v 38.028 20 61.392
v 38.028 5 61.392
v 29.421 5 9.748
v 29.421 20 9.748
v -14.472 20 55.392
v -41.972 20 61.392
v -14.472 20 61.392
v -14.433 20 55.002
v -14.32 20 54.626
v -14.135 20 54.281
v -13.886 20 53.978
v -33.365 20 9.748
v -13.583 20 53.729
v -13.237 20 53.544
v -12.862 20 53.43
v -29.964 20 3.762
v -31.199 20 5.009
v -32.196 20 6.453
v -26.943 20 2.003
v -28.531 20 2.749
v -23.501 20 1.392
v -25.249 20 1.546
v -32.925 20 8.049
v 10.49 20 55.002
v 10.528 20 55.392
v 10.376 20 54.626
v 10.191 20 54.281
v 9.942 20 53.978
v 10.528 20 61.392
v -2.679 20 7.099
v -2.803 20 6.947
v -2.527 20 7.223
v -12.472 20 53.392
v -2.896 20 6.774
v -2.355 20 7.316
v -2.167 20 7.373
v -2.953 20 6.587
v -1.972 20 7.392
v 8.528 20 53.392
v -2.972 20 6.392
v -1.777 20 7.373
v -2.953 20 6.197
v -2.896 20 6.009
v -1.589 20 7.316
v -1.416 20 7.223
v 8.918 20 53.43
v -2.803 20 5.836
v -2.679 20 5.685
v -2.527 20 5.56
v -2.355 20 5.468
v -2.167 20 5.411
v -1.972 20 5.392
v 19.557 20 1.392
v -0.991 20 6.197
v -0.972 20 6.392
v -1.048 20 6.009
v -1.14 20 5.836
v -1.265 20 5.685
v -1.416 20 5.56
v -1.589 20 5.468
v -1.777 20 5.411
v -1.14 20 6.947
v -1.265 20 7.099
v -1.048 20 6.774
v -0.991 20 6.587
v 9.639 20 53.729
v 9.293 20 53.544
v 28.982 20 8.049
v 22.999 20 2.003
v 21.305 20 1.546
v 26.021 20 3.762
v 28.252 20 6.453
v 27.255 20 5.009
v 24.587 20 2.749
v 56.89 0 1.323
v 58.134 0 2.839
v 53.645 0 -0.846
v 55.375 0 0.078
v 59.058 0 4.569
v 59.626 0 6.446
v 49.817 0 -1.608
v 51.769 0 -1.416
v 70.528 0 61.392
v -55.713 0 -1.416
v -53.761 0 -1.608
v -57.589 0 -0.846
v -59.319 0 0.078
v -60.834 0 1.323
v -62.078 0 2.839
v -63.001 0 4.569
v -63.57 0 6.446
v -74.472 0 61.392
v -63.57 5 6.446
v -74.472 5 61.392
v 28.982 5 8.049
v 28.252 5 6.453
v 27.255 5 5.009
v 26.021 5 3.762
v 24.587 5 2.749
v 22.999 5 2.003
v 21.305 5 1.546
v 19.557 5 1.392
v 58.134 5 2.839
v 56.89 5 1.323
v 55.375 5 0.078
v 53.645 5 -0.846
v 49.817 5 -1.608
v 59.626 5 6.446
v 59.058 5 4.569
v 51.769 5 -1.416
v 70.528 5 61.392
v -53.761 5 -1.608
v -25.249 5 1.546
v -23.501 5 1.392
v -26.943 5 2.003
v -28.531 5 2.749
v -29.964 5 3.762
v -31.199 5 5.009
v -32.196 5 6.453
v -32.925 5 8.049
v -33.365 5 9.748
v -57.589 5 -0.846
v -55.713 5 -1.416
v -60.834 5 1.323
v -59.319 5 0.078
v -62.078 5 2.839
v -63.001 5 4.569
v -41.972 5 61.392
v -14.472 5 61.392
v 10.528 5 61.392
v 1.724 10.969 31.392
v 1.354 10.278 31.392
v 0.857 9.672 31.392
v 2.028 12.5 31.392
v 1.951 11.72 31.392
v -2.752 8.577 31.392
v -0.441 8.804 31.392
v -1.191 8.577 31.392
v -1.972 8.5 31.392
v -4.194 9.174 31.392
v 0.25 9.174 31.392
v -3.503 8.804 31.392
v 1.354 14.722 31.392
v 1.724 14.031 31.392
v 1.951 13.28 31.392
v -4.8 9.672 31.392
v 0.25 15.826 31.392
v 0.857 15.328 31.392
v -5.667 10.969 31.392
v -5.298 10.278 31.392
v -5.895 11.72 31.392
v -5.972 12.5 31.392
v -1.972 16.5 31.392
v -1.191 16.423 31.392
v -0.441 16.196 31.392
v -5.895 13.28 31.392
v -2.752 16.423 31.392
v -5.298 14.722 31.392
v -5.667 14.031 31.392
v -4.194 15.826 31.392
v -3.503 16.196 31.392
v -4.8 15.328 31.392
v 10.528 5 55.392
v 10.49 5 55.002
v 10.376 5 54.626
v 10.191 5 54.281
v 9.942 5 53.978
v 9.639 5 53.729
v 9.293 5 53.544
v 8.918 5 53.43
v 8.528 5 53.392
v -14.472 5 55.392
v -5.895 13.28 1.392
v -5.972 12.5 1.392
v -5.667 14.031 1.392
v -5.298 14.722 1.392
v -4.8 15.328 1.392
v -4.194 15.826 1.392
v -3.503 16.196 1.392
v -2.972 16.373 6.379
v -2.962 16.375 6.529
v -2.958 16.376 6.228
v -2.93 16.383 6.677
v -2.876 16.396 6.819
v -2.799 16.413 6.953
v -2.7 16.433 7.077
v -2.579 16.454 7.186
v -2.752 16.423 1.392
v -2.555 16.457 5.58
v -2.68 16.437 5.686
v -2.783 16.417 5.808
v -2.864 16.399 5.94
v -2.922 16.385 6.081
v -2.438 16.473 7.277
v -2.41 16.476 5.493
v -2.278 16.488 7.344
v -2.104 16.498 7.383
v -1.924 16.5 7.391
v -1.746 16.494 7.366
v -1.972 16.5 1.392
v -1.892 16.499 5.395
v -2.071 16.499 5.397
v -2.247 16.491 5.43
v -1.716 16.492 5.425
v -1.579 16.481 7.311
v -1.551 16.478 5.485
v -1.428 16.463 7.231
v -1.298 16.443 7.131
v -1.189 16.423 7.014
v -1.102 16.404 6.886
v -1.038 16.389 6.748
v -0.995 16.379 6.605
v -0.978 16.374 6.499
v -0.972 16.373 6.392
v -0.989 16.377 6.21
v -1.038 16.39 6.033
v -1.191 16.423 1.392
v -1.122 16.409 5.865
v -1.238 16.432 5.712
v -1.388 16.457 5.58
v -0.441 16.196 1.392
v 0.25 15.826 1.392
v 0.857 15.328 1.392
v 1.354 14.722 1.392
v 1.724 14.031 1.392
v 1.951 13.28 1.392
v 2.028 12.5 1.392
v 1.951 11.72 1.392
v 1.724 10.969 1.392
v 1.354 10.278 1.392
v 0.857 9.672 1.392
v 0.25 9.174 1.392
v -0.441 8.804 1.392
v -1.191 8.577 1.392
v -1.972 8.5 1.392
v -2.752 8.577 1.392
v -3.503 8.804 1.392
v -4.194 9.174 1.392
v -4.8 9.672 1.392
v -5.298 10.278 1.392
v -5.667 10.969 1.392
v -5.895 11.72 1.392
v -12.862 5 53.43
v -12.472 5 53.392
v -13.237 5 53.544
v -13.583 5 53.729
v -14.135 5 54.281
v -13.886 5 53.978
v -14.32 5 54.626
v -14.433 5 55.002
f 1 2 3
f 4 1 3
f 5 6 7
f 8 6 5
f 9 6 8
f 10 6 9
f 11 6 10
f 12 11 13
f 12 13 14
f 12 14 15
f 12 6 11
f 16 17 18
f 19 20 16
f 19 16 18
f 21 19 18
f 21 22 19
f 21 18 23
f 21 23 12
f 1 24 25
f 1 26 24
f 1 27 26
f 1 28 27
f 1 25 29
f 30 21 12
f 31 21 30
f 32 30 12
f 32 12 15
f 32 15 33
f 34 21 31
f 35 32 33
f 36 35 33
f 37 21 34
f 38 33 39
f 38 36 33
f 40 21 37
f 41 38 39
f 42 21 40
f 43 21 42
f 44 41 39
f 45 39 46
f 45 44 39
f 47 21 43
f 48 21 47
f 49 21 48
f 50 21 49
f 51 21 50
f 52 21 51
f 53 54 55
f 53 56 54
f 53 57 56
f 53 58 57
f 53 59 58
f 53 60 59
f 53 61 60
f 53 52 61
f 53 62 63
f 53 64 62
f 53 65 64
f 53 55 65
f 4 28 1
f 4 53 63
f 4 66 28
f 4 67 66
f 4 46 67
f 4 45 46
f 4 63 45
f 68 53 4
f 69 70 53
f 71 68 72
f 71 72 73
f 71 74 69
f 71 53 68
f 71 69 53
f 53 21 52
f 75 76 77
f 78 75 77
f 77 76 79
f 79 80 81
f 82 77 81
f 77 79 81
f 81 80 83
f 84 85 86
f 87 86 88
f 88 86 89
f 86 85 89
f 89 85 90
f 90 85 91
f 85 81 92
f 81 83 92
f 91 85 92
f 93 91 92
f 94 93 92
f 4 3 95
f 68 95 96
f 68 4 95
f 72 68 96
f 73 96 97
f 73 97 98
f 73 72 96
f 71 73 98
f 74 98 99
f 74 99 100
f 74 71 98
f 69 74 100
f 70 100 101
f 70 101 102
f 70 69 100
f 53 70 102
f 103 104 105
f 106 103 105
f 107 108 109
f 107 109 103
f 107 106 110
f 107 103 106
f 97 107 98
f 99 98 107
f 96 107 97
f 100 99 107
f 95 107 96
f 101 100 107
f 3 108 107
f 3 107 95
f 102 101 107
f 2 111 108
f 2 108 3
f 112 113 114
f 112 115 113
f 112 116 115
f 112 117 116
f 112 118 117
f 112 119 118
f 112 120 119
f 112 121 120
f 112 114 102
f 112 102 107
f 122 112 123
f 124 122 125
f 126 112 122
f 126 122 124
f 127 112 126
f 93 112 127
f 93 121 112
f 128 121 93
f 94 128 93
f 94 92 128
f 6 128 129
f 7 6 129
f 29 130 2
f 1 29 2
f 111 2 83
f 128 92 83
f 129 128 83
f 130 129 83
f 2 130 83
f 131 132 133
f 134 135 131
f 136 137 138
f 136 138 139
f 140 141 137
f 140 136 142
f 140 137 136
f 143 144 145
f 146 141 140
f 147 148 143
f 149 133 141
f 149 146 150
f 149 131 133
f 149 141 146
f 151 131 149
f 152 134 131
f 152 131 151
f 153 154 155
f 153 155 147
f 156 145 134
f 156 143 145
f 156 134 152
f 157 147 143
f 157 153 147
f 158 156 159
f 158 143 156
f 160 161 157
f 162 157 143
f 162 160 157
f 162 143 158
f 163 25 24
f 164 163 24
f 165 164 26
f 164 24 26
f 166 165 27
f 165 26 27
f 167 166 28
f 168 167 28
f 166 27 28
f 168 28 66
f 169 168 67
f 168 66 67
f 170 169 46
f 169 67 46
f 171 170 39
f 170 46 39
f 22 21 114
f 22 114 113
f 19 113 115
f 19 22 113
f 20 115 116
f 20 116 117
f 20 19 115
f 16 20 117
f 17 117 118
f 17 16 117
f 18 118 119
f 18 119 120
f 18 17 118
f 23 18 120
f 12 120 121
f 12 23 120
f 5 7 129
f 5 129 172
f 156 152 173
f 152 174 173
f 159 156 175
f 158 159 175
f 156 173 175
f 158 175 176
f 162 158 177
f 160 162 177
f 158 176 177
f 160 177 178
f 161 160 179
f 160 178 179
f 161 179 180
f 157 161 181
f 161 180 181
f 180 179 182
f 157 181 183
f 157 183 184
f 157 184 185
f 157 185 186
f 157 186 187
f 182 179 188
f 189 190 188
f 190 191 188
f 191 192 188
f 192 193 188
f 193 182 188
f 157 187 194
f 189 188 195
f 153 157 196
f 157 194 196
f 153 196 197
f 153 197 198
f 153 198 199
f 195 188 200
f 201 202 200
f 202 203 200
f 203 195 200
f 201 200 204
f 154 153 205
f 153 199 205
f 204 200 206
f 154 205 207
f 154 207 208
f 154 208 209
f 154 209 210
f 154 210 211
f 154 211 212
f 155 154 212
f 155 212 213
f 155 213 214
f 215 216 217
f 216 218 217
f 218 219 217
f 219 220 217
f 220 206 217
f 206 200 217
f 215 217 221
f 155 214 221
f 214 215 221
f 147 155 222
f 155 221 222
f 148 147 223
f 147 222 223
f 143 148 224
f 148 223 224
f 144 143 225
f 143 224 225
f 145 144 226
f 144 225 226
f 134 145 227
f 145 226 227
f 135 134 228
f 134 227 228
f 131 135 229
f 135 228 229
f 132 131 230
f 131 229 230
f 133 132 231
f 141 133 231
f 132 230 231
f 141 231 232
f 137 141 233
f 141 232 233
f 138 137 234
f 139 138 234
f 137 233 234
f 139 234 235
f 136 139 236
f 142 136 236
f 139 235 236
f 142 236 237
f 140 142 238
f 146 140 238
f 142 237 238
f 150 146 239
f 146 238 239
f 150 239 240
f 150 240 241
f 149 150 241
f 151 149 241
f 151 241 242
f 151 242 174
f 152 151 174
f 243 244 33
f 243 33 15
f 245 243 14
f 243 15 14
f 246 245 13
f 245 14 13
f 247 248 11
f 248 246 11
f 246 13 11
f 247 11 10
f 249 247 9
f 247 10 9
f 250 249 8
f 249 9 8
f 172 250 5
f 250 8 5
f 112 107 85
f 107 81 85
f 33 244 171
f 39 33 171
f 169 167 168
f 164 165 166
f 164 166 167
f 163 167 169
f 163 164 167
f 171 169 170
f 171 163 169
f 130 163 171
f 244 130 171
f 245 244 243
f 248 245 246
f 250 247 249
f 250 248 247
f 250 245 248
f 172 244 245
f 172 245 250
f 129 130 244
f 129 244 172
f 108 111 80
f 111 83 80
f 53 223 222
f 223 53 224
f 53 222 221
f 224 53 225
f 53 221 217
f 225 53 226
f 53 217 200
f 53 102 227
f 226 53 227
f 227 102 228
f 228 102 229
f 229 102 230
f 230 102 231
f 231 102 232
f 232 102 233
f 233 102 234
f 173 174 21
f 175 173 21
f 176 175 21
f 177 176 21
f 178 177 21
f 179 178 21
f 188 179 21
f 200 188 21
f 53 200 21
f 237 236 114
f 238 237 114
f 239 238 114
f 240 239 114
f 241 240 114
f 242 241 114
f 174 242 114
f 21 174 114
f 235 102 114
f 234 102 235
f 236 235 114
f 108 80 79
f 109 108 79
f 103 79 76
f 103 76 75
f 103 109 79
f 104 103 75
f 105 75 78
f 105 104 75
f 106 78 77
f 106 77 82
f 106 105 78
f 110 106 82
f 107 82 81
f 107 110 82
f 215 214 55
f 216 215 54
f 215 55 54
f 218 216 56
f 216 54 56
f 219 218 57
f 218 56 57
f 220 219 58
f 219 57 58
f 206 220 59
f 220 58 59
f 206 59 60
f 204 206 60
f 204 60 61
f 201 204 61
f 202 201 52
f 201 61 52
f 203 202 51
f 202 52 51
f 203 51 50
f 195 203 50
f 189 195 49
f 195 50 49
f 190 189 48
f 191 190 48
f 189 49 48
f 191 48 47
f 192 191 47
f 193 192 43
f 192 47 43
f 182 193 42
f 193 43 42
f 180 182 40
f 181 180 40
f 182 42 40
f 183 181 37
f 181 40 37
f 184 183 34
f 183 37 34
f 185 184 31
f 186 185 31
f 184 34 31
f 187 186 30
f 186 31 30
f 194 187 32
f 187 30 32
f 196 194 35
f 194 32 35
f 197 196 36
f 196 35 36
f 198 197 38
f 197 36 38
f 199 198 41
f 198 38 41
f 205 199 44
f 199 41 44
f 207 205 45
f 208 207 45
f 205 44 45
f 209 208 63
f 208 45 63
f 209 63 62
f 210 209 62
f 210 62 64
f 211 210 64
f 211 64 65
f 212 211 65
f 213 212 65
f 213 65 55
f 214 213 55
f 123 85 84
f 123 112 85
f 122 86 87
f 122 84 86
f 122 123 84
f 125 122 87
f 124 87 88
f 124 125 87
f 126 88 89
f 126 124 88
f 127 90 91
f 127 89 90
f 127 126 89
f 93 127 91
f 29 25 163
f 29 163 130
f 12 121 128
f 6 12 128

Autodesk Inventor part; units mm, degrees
ref_plane "YZ Plane" through (0, 0, 0) normal (1, 0, 0) x (0, 1, 0)
ref_plane "XZ Plane" through (0, 0, 0) normal (0, 1, 0) x (-1, 0, 0)
ref_plane "XY Plane" through (0, 0, 0) normal (0, 0, 1) x (1, 0, 0)
sketch "Esquisse1" plane through (0, 0, 0) normal (0, 1, 0) x (-1, 0, 0)
  line L0 (-70.5281, 61.3918) -> (-58.0281, -1.6082)
  line L1 (-58.0281, -1.6082) -> (61.9719, -1.6082)
  line L2 (61.9719, -1.6082) -> (74.4719, 61.3918)
  line L3 (74.4719, 61.3918) -> (-70.5281, 61.3918)
  dimension "d2" = 145
  dimension "d3" = 120
  dimension "d4" = 63
  dimension "d5" = 12.5
extrude "Extrusion1" add sketch "Esquisse1" along normal blind 5
sketch "Esquisse2" plane through (0, 5, 0) normal (0, 1, 0) x (1, 0, 0)
  line L0 (-74.4719, -61.3918) -> (70.5281, -61.3918) projected
  line L1 (38.0281, -61.3918) -> (28.0281, -1.3918)
  line L2 (28.0281, -1.3918) -> (-31.9719, -1.3918)
  line L3 (-31.9719, -1.3918) -> (-41.9719, -61.3918)
  line L4 (-41.9719, -61.3918) -> (-14.4719, -61.3918)
  line L5 (-14.4719, -61.3918) -> (-14.4719, -53.3918)
  line L6 (-14.4719, -53.3918) -> (10.5281, -53.3918)
  line L7 (10.5281, -53.3918) -> (10.5281, -61.3918)
  line L8 (10.5281, -61.3918) -> (38.0281, -61.3918)
  point P0 (0, 0)
  dimension "d8" = 60
  dimension "d9" = 80
  dimension "d10" = 60
  dimension "d11" = 10
  dimension "d12" = 145
  dimension "d13" = 32.5
  dimension "d14" = 25
  dimension "d15" = 27.5
  dimension "d16" = 8
extrude "Extrusion2" add sketch "Esquisse2" along normal blind 15 contours L3 L2 L1 L0 L7 L6 L5
fillet "Congé1" radius 10 4 edges at (58.0281, 2.5, -1.6082) (-61.9719, 2.5, -1.6082) (-31.9719, 12.5, 1.3918) (28.0281, 12.5, 1.3918)
fillet "Congé2" radius 2 2 edges at (10.5281, 12.5, 53.3918) (-14.4719, 12.5, 53.3918)
sketch "Esquisse3" plane through (0, 20, 0) normal (0, 1, 0) x (1, 0, 0)
  circle A0 centre (-1.9719, -6.3918) radius 1
  line L0 (-14.4719, -61.3918) -> (-14.4719, -55.3918) projected
  line L1 (10.5281, -55.3918) -> (10.5281, -61.3918) projected
  line L2 (19.5569, -1.3918) -> (-23.5006, -1.3918) projected
  point P0 (0, 0)
  dimension "d21" = 2
  dimension "d22" = 25
  dimension "d23" = 12.5
  dimension "d24" = 5
extrude "Extrusion3" cut sketch "Esquisse3" against normal blind 10
sketch "Esquisse4" plane through (19.5569, 5, 1.3918) normal (0, 0, -1) x (-1, 0, 0)
  circle A0 centre (21.5287, 7.5) radius 4
  line L0 (-30.2605, 0) -> (73.3179, 0) projected
  line L1 (0, 15) -> (43.0575, 15) projected
  line L2 (61.5287, 0) -> (61.5287, 15) projected
  line L3 (-18.4713, 0) -> (-18.4713, 15) projected
  point P0 (19.5569, -5)
  dimension "d27" = 8
  dimension "d28" = 15
  dimension "d29" = 80
  dimension "d30" = 40
  dimension "d31" = 7.5
extrude "Extrusion4" cut sketch "Esquisse4" against normal blind 30
equation "\"d5\" = -0.5 * d3 + 0.5 * d2"
equation "\"d11\" = -0.5 * d10 + 0.5 * d9"
equation "\"d13\" = -0.5 * d9 + 0.5 * d12"
equation "\"d15\" = -0.5 * d14 + 0.5 * d9"
equation "\"d23\" = 0.5 * d22"
equation "\"d30\" = 0.5 * d29"
equation "\"d31\" = 0.5 * d28"
properties part number "Pont arriere" material "Bois (Cerisier)"
